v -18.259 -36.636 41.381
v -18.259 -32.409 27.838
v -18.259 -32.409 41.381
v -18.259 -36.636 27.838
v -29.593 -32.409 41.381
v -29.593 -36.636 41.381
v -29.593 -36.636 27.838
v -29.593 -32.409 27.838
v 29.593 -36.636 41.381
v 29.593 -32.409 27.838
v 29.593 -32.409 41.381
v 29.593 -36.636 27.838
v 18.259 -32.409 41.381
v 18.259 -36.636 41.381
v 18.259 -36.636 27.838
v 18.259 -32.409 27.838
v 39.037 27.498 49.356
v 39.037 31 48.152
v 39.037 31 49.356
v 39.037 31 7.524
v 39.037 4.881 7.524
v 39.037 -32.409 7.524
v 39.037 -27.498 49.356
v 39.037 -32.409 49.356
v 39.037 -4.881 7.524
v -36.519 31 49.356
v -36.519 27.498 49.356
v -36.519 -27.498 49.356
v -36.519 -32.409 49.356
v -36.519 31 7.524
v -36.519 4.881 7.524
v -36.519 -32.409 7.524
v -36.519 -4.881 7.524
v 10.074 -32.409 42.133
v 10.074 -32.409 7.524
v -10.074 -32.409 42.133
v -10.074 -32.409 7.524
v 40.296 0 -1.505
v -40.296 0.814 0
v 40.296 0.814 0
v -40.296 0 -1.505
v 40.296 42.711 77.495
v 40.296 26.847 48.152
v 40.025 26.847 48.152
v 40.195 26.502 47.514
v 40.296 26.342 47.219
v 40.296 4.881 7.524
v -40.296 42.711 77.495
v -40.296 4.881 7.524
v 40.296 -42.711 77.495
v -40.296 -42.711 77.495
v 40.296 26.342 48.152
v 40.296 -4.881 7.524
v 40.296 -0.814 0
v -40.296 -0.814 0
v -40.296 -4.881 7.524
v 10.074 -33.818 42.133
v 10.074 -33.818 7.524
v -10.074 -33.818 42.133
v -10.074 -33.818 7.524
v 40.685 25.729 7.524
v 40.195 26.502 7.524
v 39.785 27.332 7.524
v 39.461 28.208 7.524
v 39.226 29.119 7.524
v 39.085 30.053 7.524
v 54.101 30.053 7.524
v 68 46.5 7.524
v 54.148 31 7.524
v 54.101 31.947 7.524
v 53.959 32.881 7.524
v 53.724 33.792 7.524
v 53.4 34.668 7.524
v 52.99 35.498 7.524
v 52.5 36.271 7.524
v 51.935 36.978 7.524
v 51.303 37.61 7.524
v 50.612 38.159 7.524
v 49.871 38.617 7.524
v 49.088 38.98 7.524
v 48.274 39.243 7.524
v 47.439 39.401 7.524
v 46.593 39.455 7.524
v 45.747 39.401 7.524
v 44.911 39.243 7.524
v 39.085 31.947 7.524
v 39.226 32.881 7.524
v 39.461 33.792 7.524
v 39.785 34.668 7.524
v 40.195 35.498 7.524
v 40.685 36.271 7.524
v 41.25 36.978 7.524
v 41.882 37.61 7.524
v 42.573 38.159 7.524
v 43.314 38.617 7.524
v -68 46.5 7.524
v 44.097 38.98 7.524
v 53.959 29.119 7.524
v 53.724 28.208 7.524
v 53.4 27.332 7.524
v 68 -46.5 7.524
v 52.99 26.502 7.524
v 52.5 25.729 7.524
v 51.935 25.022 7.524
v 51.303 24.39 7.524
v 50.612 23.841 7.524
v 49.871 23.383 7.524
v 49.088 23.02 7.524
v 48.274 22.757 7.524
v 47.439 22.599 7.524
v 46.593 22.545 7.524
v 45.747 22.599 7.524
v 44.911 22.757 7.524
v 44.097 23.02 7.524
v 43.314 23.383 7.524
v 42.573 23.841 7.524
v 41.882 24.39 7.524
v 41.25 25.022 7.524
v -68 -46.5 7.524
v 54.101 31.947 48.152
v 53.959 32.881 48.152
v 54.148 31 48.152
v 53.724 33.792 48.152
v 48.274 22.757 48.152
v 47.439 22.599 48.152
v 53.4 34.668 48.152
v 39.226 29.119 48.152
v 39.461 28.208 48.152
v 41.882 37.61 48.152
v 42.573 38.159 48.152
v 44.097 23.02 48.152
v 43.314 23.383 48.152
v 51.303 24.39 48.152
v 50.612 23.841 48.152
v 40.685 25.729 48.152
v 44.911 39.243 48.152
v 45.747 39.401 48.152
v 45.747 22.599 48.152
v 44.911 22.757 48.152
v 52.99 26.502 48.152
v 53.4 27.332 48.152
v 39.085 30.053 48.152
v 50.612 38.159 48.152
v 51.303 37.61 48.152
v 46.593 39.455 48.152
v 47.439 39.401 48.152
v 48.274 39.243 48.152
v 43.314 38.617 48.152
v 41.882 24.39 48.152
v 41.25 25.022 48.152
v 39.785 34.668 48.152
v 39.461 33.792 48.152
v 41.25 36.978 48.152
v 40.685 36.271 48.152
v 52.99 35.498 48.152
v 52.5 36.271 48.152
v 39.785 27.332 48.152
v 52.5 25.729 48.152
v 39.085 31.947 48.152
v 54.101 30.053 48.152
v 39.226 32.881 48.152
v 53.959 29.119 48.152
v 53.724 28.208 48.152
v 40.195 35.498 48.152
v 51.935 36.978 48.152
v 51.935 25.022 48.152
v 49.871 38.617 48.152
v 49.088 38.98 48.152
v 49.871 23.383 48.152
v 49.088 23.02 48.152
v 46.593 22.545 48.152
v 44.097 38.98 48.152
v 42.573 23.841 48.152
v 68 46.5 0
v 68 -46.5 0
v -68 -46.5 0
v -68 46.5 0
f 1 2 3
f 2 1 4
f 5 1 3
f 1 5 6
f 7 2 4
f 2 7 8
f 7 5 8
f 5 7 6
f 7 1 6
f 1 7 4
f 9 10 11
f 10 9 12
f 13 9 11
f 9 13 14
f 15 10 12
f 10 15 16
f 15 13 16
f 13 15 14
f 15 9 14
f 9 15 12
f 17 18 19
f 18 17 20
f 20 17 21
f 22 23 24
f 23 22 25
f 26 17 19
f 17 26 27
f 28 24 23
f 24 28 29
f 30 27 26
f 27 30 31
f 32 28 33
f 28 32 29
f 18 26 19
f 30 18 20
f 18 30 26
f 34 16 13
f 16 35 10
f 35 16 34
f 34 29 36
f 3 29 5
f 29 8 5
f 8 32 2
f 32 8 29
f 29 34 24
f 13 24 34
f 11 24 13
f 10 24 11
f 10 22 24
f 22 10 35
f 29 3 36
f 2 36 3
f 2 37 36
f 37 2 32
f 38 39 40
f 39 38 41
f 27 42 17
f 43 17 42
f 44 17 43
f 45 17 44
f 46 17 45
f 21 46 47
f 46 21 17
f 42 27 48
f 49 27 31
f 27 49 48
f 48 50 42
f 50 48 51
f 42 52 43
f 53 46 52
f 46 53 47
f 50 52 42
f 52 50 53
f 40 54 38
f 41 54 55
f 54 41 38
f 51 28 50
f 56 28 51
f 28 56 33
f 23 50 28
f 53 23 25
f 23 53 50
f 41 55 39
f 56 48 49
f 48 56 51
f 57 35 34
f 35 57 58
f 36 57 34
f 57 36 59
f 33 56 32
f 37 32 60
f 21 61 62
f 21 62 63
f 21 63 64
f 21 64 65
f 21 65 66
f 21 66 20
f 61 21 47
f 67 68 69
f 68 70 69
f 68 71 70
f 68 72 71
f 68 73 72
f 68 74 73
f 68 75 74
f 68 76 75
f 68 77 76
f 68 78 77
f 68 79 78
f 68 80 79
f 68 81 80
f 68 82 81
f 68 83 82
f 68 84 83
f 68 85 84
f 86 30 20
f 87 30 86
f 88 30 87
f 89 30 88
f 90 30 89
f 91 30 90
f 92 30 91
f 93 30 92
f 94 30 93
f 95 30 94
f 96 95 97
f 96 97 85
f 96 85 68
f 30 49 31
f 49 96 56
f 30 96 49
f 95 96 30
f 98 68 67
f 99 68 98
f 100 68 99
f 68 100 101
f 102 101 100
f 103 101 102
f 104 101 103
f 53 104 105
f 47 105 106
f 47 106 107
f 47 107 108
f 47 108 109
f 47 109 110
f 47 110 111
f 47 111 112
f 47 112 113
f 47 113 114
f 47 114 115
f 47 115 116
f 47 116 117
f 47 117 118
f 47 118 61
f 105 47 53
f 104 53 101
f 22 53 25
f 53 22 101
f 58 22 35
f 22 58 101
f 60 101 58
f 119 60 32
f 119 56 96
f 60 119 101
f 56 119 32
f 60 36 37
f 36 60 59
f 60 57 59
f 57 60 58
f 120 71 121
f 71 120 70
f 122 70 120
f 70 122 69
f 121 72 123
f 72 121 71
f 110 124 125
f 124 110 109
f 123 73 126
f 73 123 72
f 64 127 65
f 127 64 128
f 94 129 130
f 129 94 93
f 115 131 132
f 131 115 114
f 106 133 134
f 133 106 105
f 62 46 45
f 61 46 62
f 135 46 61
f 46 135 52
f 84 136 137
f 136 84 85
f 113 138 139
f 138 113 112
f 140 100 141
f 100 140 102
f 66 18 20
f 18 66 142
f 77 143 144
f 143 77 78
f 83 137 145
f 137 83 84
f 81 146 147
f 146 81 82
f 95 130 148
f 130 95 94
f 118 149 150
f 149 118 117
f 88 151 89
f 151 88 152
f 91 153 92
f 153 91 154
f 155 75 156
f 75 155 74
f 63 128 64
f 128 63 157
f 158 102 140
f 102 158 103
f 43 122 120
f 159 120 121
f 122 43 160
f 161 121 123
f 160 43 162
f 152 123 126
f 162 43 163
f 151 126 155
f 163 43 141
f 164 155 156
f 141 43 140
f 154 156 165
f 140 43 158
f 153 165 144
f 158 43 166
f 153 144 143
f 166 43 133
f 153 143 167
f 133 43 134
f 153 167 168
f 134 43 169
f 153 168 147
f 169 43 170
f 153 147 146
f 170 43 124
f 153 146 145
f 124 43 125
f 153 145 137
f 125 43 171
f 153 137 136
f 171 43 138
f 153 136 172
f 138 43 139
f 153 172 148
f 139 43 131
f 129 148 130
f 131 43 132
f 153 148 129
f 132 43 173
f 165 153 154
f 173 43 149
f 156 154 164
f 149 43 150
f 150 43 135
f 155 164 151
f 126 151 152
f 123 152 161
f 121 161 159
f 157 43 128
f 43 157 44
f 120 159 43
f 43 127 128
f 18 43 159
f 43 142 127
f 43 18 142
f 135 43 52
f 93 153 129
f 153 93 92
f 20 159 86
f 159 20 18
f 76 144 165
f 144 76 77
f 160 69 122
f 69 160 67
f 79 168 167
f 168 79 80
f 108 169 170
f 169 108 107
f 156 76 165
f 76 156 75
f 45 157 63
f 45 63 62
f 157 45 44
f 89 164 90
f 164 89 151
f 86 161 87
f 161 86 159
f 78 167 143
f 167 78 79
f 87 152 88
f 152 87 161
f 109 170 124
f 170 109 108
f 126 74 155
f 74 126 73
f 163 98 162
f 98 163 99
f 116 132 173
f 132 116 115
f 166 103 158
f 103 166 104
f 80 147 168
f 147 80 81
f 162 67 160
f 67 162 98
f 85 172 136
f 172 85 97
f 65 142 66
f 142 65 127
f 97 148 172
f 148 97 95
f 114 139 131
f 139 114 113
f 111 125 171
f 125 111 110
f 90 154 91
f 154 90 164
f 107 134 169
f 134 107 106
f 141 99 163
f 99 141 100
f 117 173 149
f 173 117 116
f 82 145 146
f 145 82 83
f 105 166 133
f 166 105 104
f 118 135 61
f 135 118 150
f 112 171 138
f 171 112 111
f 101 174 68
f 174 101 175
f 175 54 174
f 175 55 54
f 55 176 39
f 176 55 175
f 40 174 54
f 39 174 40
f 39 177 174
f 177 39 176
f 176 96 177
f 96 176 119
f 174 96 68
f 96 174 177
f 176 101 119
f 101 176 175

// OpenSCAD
// Alpine Cabin Miniature | 高山木屋微缩场景 | original parametric CAD prototype
// CAD uses millimeters/Z-up; target dimensions [width,depth,height] mm.
// Product hypothesis only; full slicer/manifold and real-print checks required.
use <lib/commerce_forms.scad>
resize([136,93,79],auto=false)
    commercial_form(family="scenery",variant=3);
